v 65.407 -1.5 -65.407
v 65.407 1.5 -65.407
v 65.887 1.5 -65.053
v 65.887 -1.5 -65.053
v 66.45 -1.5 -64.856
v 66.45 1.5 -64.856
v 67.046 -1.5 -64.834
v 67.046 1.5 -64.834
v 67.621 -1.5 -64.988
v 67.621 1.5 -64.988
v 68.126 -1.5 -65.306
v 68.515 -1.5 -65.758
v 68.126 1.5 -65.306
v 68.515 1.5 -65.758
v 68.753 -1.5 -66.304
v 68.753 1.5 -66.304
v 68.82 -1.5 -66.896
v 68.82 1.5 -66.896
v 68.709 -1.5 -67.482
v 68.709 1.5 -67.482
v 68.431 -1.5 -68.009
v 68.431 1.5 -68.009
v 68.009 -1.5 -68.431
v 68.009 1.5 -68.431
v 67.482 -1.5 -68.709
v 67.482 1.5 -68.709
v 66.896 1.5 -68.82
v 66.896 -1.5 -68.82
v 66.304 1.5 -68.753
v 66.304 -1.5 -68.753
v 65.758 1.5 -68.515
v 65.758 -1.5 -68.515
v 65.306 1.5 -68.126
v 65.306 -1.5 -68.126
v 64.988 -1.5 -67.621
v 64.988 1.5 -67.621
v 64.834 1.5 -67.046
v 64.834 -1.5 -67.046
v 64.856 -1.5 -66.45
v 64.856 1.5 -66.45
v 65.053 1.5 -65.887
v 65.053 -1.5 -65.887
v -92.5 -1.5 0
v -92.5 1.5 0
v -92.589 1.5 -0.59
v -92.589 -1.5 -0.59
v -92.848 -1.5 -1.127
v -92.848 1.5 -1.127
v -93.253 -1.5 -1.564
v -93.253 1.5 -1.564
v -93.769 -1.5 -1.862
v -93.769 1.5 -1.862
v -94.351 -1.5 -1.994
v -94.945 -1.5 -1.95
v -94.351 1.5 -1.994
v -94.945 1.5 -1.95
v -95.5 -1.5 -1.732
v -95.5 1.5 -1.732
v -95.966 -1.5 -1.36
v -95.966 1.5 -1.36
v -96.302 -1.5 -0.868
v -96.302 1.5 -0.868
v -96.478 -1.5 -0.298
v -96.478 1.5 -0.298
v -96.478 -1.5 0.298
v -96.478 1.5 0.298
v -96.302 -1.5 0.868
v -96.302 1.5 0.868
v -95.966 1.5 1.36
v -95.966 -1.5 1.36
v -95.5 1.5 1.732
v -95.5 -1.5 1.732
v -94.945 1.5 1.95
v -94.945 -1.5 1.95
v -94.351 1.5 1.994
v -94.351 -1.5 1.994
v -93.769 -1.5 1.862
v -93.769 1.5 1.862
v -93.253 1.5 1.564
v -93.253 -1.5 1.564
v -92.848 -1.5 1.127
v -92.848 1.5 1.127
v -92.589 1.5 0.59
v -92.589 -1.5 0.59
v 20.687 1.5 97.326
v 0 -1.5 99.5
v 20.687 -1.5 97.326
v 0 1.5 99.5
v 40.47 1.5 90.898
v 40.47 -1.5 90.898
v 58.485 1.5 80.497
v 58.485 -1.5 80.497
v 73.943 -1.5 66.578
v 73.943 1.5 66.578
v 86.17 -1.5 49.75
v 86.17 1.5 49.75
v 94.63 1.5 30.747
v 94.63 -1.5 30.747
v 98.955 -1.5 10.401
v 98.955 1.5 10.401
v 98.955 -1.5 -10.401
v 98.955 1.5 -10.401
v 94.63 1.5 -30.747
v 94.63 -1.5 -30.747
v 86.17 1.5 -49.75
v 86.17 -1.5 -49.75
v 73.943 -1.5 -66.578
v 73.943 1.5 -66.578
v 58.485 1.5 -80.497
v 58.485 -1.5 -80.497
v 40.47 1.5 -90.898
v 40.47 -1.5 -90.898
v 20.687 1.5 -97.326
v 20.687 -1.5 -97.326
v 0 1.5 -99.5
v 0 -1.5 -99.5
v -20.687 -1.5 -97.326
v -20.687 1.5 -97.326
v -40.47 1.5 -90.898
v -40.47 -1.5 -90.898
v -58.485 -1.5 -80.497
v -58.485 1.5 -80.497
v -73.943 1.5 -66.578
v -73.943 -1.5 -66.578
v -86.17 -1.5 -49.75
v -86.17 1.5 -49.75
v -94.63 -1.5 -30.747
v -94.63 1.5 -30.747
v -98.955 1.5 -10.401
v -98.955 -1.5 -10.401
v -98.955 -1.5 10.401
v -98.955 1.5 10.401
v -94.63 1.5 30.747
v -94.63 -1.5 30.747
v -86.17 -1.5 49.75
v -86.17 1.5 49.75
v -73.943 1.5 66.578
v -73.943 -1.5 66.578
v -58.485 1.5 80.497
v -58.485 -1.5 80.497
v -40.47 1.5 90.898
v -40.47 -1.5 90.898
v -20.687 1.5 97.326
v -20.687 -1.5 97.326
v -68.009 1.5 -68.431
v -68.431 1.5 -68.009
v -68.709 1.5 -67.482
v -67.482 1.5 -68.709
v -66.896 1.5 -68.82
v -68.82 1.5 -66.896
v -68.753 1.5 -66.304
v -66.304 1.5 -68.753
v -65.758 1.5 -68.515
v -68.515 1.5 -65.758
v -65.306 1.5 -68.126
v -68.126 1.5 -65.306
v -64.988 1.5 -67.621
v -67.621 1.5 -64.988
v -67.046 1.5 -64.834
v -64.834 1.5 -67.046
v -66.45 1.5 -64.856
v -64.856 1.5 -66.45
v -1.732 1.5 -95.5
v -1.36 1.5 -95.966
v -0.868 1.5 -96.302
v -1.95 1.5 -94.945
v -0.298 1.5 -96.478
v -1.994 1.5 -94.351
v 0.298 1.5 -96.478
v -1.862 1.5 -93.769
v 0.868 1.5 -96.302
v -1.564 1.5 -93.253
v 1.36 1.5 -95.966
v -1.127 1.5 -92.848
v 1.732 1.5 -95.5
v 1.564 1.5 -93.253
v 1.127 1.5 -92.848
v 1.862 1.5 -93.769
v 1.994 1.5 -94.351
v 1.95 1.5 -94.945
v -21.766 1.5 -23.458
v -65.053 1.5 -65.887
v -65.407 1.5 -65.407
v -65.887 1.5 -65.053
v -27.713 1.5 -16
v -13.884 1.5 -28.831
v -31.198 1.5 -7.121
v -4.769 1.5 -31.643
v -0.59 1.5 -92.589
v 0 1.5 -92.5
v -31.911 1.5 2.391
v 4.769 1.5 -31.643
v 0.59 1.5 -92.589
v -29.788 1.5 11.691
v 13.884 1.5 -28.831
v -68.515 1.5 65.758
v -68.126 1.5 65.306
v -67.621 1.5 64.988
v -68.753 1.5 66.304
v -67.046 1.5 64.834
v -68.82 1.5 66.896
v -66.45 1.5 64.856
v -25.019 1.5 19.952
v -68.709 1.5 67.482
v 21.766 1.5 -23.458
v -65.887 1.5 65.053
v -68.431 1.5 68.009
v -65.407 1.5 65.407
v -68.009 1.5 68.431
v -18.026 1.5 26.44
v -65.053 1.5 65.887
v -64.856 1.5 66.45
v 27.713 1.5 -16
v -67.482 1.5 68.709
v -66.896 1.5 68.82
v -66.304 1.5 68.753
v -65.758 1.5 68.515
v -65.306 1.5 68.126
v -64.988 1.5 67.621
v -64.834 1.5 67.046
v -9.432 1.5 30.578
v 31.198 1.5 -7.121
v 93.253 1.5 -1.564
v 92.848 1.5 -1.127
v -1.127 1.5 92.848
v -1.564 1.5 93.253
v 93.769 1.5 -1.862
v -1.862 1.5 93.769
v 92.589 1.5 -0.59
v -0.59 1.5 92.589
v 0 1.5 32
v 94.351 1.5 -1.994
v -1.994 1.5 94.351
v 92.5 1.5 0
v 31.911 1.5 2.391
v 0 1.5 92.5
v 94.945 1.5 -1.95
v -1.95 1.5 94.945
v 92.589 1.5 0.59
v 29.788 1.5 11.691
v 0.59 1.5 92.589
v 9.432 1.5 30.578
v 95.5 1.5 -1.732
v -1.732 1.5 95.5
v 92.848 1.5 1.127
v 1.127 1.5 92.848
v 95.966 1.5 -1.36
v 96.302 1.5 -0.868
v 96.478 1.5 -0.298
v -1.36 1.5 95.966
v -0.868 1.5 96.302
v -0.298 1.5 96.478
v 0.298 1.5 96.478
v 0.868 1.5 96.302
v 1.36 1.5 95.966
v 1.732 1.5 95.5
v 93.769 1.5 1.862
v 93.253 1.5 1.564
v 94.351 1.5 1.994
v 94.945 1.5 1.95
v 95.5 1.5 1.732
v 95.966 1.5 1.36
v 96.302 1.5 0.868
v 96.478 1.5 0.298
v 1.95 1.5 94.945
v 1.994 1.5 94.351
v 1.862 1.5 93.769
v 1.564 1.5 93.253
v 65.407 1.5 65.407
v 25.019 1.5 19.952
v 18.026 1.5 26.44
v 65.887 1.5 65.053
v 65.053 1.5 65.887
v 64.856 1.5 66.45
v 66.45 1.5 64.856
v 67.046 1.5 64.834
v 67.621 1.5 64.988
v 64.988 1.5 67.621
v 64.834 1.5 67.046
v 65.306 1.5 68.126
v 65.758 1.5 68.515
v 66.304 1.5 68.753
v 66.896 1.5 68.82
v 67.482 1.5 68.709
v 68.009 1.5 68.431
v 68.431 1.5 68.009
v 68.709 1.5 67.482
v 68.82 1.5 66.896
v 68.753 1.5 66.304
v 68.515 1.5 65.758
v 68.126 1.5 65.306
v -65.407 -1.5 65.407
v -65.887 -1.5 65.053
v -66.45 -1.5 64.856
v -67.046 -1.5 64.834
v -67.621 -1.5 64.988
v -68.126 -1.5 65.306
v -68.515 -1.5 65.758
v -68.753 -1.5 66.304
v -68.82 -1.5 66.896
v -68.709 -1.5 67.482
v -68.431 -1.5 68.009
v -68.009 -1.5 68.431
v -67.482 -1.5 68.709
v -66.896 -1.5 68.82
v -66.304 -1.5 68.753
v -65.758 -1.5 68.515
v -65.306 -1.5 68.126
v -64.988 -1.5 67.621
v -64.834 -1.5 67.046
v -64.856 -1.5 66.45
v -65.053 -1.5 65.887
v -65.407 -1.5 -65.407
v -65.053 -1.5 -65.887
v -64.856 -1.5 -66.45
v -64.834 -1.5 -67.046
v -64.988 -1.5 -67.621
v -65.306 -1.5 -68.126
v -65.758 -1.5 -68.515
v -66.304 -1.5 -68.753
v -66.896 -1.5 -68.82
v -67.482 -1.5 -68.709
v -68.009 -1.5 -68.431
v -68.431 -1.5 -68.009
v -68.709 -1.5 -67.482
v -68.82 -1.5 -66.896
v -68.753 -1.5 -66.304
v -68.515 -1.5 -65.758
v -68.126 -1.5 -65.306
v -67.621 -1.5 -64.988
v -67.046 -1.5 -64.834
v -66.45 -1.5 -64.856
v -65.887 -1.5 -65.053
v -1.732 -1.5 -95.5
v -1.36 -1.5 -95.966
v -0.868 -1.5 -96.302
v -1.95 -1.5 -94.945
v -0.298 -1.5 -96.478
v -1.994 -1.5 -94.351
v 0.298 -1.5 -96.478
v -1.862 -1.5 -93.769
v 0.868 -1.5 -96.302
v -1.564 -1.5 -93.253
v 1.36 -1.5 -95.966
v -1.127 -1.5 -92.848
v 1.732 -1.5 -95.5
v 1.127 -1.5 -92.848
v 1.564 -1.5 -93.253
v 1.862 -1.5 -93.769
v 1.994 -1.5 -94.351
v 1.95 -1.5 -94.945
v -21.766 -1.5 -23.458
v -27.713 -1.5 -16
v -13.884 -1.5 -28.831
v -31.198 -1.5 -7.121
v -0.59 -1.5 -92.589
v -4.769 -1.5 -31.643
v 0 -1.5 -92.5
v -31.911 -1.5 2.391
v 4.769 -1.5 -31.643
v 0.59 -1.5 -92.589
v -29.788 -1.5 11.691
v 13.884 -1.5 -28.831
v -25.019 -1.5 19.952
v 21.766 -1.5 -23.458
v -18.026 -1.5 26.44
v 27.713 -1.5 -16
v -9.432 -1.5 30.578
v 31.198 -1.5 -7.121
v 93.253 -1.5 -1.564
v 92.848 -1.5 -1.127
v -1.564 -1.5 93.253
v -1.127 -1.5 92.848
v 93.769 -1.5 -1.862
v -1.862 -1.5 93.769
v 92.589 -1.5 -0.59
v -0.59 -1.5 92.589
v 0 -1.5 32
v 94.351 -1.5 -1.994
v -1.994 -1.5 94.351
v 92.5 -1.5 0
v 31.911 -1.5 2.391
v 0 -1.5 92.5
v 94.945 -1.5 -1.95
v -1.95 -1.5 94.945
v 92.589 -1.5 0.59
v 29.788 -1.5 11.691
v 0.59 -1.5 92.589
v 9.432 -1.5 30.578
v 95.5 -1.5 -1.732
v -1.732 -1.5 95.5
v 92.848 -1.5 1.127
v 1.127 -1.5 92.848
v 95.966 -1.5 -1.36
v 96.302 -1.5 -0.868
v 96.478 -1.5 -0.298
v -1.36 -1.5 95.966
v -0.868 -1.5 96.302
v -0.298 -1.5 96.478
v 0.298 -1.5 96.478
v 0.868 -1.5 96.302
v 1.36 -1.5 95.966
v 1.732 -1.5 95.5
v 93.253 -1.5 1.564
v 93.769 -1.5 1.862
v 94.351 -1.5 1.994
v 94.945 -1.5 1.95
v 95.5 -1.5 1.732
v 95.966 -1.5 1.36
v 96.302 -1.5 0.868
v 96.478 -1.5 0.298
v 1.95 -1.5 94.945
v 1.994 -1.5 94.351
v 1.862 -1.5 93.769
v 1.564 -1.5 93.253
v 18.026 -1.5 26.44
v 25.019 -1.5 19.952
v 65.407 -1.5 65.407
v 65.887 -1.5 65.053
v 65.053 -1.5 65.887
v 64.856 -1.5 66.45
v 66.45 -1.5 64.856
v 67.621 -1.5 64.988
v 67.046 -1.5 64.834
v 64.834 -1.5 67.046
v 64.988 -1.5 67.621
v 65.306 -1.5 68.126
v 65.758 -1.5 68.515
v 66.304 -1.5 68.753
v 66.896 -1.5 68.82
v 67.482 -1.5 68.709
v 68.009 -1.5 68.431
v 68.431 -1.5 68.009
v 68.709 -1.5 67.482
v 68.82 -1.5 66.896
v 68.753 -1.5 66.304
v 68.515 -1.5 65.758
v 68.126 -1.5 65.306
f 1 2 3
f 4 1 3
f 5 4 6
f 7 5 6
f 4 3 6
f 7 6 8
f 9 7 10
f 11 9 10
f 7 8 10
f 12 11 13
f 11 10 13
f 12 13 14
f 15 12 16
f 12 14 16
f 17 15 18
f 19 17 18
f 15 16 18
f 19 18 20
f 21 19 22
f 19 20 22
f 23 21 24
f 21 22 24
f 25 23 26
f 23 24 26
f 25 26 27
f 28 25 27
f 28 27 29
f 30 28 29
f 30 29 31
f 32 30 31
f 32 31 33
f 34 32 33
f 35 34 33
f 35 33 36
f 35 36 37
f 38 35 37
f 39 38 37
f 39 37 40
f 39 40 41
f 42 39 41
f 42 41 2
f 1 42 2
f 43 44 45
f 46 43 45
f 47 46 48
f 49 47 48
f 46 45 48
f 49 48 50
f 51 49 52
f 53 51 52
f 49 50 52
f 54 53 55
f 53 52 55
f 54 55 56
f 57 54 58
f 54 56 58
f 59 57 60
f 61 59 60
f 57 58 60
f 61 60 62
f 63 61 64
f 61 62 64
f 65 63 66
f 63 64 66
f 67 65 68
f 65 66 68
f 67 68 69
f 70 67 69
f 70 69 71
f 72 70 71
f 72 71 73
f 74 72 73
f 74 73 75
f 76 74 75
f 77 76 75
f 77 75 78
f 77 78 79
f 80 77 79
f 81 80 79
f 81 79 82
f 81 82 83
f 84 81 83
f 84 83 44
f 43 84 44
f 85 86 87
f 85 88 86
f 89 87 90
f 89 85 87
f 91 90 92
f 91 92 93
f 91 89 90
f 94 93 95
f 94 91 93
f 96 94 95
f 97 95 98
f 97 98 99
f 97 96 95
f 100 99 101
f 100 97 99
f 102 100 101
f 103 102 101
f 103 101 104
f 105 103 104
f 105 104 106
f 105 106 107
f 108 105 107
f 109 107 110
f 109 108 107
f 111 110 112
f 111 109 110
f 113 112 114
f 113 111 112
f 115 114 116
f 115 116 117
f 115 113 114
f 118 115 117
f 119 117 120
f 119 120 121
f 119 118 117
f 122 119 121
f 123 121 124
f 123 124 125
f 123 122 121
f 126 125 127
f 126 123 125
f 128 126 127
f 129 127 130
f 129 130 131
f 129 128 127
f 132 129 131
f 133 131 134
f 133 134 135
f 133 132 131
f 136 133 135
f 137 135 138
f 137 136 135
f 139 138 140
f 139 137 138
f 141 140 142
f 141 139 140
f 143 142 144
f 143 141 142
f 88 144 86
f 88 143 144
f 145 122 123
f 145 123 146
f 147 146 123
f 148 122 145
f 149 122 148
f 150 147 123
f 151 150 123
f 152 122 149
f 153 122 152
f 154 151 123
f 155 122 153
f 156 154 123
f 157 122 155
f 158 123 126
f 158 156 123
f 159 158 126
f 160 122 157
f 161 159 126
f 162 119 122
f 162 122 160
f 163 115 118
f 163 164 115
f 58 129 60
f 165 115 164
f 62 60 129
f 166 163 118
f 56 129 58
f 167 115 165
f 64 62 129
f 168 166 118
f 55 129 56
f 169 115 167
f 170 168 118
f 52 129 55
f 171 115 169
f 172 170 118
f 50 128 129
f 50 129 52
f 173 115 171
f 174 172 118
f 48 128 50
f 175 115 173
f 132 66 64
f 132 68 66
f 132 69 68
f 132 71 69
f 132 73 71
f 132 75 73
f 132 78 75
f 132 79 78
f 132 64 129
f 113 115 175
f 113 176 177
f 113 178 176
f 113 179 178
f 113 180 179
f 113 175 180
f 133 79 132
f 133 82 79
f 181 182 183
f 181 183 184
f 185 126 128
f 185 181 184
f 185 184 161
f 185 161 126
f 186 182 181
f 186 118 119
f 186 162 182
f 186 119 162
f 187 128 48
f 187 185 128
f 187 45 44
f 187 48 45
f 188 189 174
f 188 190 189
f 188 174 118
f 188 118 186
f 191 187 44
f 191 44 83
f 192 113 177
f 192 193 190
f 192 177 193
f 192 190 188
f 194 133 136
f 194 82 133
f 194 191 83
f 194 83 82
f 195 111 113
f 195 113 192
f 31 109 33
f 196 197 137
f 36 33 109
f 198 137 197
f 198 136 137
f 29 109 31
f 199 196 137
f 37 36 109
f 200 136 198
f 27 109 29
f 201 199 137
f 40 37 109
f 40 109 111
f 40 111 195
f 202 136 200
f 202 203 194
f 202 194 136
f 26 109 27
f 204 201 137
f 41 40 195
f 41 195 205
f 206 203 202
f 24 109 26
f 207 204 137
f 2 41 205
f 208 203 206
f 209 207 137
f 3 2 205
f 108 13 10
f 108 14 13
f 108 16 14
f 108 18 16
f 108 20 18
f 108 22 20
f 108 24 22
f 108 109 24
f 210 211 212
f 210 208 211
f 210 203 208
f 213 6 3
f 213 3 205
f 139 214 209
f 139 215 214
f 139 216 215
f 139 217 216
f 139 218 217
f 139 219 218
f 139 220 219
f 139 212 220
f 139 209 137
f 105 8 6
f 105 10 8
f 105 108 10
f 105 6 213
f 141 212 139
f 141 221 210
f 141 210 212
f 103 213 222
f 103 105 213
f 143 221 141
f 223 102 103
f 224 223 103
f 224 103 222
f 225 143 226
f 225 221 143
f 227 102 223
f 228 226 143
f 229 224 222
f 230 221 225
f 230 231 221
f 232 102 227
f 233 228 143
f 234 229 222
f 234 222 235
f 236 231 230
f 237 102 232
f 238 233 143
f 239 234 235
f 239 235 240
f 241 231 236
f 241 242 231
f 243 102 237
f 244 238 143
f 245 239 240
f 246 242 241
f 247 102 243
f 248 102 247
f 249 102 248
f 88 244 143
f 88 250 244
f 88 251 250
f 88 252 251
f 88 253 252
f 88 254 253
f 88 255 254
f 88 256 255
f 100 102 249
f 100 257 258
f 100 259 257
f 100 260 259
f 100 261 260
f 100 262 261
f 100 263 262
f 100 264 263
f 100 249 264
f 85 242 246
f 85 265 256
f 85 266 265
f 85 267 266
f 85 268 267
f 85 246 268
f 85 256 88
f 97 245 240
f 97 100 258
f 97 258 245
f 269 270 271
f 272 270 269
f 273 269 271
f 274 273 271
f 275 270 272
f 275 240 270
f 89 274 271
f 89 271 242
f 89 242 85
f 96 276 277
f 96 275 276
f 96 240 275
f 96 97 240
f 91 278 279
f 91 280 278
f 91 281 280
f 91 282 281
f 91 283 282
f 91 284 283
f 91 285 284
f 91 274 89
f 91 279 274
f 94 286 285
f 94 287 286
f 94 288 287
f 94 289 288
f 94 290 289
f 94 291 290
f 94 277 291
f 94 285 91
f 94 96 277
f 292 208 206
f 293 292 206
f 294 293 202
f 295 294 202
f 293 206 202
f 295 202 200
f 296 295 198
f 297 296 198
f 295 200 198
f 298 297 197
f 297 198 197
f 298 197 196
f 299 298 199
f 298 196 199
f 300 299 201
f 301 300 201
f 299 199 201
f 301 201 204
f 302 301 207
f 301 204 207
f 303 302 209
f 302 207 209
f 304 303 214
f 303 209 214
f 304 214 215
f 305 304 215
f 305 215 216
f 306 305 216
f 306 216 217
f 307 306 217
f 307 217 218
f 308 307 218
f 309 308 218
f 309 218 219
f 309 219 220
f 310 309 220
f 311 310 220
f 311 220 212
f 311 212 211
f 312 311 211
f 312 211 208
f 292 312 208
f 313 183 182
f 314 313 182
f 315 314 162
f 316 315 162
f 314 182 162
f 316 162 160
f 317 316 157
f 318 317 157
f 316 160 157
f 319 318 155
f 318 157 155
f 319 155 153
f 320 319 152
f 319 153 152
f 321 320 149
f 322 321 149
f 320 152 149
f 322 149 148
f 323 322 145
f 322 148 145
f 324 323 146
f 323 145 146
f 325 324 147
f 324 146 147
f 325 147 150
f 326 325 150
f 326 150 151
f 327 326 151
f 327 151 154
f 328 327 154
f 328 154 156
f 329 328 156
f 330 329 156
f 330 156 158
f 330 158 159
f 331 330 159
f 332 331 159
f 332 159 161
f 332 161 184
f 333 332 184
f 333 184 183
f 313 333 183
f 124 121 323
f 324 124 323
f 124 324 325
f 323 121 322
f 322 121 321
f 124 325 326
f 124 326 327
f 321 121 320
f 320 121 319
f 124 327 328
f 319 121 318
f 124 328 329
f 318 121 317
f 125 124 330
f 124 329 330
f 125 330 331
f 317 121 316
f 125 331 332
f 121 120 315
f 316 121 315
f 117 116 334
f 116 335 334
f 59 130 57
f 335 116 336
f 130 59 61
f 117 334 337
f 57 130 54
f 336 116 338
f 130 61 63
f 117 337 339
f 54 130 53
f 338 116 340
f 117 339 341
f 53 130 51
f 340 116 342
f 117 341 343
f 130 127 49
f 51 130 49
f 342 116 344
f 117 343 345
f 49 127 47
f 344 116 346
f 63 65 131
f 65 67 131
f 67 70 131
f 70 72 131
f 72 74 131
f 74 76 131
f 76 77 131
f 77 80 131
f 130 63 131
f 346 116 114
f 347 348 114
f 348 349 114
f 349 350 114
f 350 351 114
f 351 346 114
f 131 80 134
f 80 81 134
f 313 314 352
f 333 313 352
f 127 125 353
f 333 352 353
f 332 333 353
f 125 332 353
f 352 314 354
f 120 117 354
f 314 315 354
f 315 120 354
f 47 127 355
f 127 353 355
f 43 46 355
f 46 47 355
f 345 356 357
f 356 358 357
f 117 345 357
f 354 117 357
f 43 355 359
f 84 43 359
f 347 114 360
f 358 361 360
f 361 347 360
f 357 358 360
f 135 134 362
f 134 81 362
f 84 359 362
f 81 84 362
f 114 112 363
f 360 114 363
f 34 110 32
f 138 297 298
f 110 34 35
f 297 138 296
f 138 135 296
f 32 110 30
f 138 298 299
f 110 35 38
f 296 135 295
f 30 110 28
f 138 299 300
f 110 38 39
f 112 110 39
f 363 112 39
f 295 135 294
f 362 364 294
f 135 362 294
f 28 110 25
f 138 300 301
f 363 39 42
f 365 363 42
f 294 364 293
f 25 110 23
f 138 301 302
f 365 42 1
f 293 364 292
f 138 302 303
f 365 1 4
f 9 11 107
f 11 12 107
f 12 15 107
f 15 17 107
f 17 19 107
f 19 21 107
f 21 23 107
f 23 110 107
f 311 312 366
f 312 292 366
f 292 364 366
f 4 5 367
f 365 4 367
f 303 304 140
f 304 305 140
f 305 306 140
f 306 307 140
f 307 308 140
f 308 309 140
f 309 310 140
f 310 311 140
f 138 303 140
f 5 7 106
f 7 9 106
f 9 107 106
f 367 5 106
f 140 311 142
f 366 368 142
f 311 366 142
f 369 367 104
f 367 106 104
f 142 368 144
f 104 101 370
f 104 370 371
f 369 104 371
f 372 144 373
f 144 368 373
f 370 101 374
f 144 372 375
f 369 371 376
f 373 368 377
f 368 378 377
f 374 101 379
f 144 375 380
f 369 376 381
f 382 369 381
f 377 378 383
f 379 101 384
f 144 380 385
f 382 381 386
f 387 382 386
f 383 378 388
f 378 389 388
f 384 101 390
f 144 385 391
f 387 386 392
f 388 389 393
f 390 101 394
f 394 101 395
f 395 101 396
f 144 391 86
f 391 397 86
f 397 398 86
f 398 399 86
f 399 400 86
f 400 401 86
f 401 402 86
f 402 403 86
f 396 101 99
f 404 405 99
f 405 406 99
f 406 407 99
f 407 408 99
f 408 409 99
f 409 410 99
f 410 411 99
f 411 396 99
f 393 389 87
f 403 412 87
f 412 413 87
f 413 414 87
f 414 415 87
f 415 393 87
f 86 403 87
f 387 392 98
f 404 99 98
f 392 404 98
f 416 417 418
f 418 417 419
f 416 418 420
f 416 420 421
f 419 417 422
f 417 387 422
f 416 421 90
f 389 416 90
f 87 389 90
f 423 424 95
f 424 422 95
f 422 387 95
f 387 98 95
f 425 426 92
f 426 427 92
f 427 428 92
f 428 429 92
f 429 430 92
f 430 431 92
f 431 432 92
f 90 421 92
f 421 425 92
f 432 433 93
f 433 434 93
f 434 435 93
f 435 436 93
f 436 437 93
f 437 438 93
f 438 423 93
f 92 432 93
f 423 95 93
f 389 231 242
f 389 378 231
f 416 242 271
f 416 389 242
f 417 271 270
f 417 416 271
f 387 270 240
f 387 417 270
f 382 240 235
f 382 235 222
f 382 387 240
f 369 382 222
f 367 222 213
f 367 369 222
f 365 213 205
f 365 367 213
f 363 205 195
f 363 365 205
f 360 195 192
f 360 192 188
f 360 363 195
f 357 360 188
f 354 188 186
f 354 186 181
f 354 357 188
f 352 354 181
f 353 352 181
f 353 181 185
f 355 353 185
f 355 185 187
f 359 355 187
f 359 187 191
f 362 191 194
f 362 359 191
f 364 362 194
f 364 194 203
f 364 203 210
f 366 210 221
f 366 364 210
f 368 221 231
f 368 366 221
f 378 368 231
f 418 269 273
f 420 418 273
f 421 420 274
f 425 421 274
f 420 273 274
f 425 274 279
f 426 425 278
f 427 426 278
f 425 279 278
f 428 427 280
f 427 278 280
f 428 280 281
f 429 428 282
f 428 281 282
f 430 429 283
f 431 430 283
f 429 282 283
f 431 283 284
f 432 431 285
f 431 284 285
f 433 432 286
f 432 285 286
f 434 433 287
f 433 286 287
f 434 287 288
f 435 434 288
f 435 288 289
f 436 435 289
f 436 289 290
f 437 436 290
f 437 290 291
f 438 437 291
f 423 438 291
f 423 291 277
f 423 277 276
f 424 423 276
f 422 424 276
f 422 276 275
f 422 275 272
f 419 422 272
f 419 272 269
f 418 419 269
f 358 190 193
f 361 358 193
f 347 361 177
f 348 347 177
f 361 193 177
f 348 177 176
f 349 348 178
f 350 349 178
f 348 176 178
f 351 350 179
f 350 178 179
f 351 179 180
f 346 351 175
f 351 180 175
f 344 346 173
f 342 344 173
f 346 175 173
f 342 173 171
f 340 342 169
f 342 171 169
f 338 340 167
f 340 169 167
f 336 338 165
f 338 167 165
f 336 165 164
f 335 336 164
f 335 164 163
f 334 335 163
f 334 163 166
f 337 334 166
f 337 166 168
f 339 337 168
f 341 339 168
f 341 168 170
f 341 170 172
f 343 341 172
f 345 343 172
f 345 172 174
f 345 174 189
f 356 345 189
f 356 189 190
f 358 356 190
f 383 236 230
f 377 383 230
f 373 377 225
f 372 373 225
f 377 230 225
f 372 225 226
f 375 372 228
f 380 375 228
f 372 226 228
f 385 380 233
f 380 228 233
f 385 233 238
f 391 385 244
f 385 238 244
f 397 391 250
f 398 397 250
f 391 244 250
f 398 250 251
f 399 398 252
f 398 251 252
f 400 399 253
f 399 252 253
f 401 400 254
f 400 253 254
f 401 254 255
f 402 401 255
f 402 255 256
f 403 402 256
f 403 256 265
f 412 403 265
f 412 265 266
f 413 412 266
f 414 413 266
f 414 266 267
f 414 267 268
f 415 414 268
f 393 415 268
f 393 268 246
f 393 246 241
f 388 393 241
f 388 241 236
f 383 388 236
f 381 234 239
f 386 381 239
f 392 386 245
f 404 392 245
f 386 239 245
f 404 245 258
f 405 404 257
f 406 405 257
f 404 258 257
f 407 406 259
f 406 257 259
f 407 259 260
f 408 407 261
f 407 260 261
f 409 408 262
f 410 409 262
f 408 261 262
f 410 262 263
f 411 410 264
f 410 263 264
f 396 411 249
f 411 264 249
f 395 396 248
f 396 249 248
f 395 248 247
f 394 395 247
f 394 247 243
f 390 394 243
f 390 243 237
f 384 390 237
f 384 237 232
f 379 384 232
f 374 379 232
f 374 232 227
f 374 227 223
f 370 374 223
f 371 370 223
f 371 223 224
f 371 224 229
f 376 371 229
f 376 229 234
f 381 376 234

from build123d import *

# Parameters (mm, degrees)
SKETCH1_R                     = 99.5
SKETCH1_R_2                   = 32
BASE_DEPTH                    = 1.5
SKETCH2_R                     = 2
STRUCTURAL_HOLE_DEPTH         = 141.746225527
STRUCTURAL_HOLE_PATTERN_COUNT = 8


with BuildPart() as part:
    # Sketch1 → Base (new, symmetric)
    with BuildSketch(Plane(origin=(0, 0, 0), x_dir=(1, 0, 0), z_dir=(0, 1, 0))):
        with Locations(Location((0, 0, 0), (0, 0, 270))):
            Circle(SKETCH1_R)
        with Locations(Location((0, 0, 0), (0, 0, 270))):
            Circle(SKETCH1_R_2, mode=Mode.SUBTRACT)
    extrude(amount=BASE_DEPTH, both=True)

    # Sketch2 → Structural Hole (cut, through all)
    with BuildSketch(Plane(origin=(0, 1.5, 0), x_dir=(1, 0, 0), z_dir=(0, 1, 0))):
        with Locations(Location((0, 94.5, 0), (0, 0, 270))):
            Circle(SKETCH2_R)
    structural_hole = extrude(amount=-STRUCTURAL_HOLE_DEPTH, mode=Mode.SUBTRACT)

    # Structural Hole Pattern: Structural Hole ×8 about axis
    structural_hole_pattern_axis = Axis((0, 0, 0), (0, 1, 0))
    for i in range(1, STRUCTURAL_HOLE_PATTERN_COUNT):
        add(structural_hole.rotate(structural_hole_pattern_axis, i * 360 / STRUCTURAL_HOLE_PATTERN_COUNT), mode=Mode.SUBTRACT)


solid = part.part
